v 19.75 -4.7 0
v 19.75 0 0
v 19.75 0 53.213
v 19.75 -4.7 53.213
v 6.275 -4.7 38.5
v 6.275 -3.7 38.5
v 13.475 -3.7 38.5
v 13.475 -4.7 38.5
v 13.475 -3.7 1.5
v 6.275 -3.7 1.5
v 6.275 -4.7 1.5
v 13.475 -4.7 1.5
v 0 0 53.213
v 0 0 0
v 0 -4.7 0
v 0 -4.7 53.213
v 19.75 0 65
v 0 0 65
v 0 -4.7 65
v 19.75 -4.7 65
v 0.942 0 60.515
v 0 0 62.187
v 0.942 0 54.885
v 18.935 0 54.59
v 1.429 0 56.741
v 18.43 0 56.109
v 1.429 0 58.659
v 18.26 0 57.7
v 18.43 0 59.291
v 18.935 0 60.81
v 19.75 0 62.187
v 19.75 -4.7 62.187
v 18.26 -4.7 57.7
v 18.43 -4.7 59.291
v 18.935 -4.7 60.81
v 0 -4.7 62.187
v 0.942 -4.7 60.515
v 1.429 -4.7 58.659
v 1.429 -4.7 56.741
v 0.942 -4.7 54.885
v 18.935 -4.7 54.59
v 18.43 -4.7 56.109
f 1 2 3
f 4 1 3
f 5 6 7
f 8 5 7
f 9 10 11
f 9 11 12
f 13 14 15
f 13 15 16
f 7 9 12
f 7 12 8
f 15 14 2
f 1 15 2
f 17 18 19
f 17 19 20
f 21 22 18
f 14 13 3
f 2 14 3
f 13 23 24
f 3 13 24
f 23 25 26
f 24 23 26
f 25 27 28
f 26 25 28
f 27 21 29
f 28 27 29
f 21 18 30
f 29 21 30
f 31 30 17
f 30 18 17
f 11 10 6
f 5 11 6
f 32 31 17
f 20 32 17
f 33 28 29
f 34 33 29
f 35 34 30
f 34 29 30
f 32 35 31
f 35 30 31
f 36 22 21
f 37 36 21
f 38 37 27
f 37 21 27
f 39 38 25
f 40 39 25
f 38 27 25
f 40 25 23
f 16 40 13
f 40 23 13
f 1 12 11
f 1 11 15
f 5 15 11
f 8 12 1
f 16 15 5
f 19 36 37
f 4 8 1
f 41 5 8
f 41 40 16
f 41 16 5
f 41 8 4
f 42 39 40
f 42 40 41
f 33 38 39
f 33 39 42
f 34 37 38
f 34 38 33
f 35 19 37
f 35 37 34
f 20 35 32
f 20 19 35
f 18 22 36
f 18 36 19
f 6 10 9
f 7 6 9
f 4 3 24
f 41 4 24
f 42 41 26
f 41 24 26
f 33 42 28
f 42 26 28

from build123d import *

# Parameters (mm, degrees)
F0_W     = 19.75
F0_H     = 65
F0_W_2   = 7.2
F0_H_2   = 37
F1_DEPTH = 4.7
F2_DEPTH = 3.7
F4_DEPTH = 4.701


with BuildPart() as f1:
    # F0 (on Front) → F1 (new body)
    with BuildSketch(Plane.XZ):
        with Locations((9.875, 32.5)):
            Rectangle(F0_W, F0_H)
        with Locations((9.875, 20)):
            Rectangle(F0_W_2, F0_H_2, mode=Mode.SUBTRACT)
    extrude(amount=F1_DEPTH)

    # F0 (on Front) → F2 (join)
    with BuildSketch(Plane.XZ):
        with Locations((9.875, 20)):
            Rectangle(F0_W_2, F0_H_2)
    extrude(amount=F2_DEPTH)

    # F3 (on face) → F4 (cut, through all)
    with BuildSketch(Plane(origin=(0, 0, 0), x_dir=(-1, 0, 0), z_dir=(0, 1, 0))):
        with BuildLine():
            ThreePointArc((-19.75, 53.2128467794), (-18.6419559311, 55.3359042131), (-18.2596136294, 57.7))
            ThreePointArc((-18.2596136294, 57.7), (-18.6419559311, 60.0640957869), (-19.75, 62.1871532206))
            Line((-19.75, 62.1871532206), (-19.75, 53.2128467794))
        make_face()
        with BuildLine():
            Line((0, 53.2128467794), (0, 62.1871532206))
            ThreePointArc((0, 62.1871532206), (-1.4903863706, 57.7), (0, 53.2128467794))
        make_face()
    extrude(amount=-F4_DEPTH, mode=Mode.SUBTRACT)


solid = f1.part
